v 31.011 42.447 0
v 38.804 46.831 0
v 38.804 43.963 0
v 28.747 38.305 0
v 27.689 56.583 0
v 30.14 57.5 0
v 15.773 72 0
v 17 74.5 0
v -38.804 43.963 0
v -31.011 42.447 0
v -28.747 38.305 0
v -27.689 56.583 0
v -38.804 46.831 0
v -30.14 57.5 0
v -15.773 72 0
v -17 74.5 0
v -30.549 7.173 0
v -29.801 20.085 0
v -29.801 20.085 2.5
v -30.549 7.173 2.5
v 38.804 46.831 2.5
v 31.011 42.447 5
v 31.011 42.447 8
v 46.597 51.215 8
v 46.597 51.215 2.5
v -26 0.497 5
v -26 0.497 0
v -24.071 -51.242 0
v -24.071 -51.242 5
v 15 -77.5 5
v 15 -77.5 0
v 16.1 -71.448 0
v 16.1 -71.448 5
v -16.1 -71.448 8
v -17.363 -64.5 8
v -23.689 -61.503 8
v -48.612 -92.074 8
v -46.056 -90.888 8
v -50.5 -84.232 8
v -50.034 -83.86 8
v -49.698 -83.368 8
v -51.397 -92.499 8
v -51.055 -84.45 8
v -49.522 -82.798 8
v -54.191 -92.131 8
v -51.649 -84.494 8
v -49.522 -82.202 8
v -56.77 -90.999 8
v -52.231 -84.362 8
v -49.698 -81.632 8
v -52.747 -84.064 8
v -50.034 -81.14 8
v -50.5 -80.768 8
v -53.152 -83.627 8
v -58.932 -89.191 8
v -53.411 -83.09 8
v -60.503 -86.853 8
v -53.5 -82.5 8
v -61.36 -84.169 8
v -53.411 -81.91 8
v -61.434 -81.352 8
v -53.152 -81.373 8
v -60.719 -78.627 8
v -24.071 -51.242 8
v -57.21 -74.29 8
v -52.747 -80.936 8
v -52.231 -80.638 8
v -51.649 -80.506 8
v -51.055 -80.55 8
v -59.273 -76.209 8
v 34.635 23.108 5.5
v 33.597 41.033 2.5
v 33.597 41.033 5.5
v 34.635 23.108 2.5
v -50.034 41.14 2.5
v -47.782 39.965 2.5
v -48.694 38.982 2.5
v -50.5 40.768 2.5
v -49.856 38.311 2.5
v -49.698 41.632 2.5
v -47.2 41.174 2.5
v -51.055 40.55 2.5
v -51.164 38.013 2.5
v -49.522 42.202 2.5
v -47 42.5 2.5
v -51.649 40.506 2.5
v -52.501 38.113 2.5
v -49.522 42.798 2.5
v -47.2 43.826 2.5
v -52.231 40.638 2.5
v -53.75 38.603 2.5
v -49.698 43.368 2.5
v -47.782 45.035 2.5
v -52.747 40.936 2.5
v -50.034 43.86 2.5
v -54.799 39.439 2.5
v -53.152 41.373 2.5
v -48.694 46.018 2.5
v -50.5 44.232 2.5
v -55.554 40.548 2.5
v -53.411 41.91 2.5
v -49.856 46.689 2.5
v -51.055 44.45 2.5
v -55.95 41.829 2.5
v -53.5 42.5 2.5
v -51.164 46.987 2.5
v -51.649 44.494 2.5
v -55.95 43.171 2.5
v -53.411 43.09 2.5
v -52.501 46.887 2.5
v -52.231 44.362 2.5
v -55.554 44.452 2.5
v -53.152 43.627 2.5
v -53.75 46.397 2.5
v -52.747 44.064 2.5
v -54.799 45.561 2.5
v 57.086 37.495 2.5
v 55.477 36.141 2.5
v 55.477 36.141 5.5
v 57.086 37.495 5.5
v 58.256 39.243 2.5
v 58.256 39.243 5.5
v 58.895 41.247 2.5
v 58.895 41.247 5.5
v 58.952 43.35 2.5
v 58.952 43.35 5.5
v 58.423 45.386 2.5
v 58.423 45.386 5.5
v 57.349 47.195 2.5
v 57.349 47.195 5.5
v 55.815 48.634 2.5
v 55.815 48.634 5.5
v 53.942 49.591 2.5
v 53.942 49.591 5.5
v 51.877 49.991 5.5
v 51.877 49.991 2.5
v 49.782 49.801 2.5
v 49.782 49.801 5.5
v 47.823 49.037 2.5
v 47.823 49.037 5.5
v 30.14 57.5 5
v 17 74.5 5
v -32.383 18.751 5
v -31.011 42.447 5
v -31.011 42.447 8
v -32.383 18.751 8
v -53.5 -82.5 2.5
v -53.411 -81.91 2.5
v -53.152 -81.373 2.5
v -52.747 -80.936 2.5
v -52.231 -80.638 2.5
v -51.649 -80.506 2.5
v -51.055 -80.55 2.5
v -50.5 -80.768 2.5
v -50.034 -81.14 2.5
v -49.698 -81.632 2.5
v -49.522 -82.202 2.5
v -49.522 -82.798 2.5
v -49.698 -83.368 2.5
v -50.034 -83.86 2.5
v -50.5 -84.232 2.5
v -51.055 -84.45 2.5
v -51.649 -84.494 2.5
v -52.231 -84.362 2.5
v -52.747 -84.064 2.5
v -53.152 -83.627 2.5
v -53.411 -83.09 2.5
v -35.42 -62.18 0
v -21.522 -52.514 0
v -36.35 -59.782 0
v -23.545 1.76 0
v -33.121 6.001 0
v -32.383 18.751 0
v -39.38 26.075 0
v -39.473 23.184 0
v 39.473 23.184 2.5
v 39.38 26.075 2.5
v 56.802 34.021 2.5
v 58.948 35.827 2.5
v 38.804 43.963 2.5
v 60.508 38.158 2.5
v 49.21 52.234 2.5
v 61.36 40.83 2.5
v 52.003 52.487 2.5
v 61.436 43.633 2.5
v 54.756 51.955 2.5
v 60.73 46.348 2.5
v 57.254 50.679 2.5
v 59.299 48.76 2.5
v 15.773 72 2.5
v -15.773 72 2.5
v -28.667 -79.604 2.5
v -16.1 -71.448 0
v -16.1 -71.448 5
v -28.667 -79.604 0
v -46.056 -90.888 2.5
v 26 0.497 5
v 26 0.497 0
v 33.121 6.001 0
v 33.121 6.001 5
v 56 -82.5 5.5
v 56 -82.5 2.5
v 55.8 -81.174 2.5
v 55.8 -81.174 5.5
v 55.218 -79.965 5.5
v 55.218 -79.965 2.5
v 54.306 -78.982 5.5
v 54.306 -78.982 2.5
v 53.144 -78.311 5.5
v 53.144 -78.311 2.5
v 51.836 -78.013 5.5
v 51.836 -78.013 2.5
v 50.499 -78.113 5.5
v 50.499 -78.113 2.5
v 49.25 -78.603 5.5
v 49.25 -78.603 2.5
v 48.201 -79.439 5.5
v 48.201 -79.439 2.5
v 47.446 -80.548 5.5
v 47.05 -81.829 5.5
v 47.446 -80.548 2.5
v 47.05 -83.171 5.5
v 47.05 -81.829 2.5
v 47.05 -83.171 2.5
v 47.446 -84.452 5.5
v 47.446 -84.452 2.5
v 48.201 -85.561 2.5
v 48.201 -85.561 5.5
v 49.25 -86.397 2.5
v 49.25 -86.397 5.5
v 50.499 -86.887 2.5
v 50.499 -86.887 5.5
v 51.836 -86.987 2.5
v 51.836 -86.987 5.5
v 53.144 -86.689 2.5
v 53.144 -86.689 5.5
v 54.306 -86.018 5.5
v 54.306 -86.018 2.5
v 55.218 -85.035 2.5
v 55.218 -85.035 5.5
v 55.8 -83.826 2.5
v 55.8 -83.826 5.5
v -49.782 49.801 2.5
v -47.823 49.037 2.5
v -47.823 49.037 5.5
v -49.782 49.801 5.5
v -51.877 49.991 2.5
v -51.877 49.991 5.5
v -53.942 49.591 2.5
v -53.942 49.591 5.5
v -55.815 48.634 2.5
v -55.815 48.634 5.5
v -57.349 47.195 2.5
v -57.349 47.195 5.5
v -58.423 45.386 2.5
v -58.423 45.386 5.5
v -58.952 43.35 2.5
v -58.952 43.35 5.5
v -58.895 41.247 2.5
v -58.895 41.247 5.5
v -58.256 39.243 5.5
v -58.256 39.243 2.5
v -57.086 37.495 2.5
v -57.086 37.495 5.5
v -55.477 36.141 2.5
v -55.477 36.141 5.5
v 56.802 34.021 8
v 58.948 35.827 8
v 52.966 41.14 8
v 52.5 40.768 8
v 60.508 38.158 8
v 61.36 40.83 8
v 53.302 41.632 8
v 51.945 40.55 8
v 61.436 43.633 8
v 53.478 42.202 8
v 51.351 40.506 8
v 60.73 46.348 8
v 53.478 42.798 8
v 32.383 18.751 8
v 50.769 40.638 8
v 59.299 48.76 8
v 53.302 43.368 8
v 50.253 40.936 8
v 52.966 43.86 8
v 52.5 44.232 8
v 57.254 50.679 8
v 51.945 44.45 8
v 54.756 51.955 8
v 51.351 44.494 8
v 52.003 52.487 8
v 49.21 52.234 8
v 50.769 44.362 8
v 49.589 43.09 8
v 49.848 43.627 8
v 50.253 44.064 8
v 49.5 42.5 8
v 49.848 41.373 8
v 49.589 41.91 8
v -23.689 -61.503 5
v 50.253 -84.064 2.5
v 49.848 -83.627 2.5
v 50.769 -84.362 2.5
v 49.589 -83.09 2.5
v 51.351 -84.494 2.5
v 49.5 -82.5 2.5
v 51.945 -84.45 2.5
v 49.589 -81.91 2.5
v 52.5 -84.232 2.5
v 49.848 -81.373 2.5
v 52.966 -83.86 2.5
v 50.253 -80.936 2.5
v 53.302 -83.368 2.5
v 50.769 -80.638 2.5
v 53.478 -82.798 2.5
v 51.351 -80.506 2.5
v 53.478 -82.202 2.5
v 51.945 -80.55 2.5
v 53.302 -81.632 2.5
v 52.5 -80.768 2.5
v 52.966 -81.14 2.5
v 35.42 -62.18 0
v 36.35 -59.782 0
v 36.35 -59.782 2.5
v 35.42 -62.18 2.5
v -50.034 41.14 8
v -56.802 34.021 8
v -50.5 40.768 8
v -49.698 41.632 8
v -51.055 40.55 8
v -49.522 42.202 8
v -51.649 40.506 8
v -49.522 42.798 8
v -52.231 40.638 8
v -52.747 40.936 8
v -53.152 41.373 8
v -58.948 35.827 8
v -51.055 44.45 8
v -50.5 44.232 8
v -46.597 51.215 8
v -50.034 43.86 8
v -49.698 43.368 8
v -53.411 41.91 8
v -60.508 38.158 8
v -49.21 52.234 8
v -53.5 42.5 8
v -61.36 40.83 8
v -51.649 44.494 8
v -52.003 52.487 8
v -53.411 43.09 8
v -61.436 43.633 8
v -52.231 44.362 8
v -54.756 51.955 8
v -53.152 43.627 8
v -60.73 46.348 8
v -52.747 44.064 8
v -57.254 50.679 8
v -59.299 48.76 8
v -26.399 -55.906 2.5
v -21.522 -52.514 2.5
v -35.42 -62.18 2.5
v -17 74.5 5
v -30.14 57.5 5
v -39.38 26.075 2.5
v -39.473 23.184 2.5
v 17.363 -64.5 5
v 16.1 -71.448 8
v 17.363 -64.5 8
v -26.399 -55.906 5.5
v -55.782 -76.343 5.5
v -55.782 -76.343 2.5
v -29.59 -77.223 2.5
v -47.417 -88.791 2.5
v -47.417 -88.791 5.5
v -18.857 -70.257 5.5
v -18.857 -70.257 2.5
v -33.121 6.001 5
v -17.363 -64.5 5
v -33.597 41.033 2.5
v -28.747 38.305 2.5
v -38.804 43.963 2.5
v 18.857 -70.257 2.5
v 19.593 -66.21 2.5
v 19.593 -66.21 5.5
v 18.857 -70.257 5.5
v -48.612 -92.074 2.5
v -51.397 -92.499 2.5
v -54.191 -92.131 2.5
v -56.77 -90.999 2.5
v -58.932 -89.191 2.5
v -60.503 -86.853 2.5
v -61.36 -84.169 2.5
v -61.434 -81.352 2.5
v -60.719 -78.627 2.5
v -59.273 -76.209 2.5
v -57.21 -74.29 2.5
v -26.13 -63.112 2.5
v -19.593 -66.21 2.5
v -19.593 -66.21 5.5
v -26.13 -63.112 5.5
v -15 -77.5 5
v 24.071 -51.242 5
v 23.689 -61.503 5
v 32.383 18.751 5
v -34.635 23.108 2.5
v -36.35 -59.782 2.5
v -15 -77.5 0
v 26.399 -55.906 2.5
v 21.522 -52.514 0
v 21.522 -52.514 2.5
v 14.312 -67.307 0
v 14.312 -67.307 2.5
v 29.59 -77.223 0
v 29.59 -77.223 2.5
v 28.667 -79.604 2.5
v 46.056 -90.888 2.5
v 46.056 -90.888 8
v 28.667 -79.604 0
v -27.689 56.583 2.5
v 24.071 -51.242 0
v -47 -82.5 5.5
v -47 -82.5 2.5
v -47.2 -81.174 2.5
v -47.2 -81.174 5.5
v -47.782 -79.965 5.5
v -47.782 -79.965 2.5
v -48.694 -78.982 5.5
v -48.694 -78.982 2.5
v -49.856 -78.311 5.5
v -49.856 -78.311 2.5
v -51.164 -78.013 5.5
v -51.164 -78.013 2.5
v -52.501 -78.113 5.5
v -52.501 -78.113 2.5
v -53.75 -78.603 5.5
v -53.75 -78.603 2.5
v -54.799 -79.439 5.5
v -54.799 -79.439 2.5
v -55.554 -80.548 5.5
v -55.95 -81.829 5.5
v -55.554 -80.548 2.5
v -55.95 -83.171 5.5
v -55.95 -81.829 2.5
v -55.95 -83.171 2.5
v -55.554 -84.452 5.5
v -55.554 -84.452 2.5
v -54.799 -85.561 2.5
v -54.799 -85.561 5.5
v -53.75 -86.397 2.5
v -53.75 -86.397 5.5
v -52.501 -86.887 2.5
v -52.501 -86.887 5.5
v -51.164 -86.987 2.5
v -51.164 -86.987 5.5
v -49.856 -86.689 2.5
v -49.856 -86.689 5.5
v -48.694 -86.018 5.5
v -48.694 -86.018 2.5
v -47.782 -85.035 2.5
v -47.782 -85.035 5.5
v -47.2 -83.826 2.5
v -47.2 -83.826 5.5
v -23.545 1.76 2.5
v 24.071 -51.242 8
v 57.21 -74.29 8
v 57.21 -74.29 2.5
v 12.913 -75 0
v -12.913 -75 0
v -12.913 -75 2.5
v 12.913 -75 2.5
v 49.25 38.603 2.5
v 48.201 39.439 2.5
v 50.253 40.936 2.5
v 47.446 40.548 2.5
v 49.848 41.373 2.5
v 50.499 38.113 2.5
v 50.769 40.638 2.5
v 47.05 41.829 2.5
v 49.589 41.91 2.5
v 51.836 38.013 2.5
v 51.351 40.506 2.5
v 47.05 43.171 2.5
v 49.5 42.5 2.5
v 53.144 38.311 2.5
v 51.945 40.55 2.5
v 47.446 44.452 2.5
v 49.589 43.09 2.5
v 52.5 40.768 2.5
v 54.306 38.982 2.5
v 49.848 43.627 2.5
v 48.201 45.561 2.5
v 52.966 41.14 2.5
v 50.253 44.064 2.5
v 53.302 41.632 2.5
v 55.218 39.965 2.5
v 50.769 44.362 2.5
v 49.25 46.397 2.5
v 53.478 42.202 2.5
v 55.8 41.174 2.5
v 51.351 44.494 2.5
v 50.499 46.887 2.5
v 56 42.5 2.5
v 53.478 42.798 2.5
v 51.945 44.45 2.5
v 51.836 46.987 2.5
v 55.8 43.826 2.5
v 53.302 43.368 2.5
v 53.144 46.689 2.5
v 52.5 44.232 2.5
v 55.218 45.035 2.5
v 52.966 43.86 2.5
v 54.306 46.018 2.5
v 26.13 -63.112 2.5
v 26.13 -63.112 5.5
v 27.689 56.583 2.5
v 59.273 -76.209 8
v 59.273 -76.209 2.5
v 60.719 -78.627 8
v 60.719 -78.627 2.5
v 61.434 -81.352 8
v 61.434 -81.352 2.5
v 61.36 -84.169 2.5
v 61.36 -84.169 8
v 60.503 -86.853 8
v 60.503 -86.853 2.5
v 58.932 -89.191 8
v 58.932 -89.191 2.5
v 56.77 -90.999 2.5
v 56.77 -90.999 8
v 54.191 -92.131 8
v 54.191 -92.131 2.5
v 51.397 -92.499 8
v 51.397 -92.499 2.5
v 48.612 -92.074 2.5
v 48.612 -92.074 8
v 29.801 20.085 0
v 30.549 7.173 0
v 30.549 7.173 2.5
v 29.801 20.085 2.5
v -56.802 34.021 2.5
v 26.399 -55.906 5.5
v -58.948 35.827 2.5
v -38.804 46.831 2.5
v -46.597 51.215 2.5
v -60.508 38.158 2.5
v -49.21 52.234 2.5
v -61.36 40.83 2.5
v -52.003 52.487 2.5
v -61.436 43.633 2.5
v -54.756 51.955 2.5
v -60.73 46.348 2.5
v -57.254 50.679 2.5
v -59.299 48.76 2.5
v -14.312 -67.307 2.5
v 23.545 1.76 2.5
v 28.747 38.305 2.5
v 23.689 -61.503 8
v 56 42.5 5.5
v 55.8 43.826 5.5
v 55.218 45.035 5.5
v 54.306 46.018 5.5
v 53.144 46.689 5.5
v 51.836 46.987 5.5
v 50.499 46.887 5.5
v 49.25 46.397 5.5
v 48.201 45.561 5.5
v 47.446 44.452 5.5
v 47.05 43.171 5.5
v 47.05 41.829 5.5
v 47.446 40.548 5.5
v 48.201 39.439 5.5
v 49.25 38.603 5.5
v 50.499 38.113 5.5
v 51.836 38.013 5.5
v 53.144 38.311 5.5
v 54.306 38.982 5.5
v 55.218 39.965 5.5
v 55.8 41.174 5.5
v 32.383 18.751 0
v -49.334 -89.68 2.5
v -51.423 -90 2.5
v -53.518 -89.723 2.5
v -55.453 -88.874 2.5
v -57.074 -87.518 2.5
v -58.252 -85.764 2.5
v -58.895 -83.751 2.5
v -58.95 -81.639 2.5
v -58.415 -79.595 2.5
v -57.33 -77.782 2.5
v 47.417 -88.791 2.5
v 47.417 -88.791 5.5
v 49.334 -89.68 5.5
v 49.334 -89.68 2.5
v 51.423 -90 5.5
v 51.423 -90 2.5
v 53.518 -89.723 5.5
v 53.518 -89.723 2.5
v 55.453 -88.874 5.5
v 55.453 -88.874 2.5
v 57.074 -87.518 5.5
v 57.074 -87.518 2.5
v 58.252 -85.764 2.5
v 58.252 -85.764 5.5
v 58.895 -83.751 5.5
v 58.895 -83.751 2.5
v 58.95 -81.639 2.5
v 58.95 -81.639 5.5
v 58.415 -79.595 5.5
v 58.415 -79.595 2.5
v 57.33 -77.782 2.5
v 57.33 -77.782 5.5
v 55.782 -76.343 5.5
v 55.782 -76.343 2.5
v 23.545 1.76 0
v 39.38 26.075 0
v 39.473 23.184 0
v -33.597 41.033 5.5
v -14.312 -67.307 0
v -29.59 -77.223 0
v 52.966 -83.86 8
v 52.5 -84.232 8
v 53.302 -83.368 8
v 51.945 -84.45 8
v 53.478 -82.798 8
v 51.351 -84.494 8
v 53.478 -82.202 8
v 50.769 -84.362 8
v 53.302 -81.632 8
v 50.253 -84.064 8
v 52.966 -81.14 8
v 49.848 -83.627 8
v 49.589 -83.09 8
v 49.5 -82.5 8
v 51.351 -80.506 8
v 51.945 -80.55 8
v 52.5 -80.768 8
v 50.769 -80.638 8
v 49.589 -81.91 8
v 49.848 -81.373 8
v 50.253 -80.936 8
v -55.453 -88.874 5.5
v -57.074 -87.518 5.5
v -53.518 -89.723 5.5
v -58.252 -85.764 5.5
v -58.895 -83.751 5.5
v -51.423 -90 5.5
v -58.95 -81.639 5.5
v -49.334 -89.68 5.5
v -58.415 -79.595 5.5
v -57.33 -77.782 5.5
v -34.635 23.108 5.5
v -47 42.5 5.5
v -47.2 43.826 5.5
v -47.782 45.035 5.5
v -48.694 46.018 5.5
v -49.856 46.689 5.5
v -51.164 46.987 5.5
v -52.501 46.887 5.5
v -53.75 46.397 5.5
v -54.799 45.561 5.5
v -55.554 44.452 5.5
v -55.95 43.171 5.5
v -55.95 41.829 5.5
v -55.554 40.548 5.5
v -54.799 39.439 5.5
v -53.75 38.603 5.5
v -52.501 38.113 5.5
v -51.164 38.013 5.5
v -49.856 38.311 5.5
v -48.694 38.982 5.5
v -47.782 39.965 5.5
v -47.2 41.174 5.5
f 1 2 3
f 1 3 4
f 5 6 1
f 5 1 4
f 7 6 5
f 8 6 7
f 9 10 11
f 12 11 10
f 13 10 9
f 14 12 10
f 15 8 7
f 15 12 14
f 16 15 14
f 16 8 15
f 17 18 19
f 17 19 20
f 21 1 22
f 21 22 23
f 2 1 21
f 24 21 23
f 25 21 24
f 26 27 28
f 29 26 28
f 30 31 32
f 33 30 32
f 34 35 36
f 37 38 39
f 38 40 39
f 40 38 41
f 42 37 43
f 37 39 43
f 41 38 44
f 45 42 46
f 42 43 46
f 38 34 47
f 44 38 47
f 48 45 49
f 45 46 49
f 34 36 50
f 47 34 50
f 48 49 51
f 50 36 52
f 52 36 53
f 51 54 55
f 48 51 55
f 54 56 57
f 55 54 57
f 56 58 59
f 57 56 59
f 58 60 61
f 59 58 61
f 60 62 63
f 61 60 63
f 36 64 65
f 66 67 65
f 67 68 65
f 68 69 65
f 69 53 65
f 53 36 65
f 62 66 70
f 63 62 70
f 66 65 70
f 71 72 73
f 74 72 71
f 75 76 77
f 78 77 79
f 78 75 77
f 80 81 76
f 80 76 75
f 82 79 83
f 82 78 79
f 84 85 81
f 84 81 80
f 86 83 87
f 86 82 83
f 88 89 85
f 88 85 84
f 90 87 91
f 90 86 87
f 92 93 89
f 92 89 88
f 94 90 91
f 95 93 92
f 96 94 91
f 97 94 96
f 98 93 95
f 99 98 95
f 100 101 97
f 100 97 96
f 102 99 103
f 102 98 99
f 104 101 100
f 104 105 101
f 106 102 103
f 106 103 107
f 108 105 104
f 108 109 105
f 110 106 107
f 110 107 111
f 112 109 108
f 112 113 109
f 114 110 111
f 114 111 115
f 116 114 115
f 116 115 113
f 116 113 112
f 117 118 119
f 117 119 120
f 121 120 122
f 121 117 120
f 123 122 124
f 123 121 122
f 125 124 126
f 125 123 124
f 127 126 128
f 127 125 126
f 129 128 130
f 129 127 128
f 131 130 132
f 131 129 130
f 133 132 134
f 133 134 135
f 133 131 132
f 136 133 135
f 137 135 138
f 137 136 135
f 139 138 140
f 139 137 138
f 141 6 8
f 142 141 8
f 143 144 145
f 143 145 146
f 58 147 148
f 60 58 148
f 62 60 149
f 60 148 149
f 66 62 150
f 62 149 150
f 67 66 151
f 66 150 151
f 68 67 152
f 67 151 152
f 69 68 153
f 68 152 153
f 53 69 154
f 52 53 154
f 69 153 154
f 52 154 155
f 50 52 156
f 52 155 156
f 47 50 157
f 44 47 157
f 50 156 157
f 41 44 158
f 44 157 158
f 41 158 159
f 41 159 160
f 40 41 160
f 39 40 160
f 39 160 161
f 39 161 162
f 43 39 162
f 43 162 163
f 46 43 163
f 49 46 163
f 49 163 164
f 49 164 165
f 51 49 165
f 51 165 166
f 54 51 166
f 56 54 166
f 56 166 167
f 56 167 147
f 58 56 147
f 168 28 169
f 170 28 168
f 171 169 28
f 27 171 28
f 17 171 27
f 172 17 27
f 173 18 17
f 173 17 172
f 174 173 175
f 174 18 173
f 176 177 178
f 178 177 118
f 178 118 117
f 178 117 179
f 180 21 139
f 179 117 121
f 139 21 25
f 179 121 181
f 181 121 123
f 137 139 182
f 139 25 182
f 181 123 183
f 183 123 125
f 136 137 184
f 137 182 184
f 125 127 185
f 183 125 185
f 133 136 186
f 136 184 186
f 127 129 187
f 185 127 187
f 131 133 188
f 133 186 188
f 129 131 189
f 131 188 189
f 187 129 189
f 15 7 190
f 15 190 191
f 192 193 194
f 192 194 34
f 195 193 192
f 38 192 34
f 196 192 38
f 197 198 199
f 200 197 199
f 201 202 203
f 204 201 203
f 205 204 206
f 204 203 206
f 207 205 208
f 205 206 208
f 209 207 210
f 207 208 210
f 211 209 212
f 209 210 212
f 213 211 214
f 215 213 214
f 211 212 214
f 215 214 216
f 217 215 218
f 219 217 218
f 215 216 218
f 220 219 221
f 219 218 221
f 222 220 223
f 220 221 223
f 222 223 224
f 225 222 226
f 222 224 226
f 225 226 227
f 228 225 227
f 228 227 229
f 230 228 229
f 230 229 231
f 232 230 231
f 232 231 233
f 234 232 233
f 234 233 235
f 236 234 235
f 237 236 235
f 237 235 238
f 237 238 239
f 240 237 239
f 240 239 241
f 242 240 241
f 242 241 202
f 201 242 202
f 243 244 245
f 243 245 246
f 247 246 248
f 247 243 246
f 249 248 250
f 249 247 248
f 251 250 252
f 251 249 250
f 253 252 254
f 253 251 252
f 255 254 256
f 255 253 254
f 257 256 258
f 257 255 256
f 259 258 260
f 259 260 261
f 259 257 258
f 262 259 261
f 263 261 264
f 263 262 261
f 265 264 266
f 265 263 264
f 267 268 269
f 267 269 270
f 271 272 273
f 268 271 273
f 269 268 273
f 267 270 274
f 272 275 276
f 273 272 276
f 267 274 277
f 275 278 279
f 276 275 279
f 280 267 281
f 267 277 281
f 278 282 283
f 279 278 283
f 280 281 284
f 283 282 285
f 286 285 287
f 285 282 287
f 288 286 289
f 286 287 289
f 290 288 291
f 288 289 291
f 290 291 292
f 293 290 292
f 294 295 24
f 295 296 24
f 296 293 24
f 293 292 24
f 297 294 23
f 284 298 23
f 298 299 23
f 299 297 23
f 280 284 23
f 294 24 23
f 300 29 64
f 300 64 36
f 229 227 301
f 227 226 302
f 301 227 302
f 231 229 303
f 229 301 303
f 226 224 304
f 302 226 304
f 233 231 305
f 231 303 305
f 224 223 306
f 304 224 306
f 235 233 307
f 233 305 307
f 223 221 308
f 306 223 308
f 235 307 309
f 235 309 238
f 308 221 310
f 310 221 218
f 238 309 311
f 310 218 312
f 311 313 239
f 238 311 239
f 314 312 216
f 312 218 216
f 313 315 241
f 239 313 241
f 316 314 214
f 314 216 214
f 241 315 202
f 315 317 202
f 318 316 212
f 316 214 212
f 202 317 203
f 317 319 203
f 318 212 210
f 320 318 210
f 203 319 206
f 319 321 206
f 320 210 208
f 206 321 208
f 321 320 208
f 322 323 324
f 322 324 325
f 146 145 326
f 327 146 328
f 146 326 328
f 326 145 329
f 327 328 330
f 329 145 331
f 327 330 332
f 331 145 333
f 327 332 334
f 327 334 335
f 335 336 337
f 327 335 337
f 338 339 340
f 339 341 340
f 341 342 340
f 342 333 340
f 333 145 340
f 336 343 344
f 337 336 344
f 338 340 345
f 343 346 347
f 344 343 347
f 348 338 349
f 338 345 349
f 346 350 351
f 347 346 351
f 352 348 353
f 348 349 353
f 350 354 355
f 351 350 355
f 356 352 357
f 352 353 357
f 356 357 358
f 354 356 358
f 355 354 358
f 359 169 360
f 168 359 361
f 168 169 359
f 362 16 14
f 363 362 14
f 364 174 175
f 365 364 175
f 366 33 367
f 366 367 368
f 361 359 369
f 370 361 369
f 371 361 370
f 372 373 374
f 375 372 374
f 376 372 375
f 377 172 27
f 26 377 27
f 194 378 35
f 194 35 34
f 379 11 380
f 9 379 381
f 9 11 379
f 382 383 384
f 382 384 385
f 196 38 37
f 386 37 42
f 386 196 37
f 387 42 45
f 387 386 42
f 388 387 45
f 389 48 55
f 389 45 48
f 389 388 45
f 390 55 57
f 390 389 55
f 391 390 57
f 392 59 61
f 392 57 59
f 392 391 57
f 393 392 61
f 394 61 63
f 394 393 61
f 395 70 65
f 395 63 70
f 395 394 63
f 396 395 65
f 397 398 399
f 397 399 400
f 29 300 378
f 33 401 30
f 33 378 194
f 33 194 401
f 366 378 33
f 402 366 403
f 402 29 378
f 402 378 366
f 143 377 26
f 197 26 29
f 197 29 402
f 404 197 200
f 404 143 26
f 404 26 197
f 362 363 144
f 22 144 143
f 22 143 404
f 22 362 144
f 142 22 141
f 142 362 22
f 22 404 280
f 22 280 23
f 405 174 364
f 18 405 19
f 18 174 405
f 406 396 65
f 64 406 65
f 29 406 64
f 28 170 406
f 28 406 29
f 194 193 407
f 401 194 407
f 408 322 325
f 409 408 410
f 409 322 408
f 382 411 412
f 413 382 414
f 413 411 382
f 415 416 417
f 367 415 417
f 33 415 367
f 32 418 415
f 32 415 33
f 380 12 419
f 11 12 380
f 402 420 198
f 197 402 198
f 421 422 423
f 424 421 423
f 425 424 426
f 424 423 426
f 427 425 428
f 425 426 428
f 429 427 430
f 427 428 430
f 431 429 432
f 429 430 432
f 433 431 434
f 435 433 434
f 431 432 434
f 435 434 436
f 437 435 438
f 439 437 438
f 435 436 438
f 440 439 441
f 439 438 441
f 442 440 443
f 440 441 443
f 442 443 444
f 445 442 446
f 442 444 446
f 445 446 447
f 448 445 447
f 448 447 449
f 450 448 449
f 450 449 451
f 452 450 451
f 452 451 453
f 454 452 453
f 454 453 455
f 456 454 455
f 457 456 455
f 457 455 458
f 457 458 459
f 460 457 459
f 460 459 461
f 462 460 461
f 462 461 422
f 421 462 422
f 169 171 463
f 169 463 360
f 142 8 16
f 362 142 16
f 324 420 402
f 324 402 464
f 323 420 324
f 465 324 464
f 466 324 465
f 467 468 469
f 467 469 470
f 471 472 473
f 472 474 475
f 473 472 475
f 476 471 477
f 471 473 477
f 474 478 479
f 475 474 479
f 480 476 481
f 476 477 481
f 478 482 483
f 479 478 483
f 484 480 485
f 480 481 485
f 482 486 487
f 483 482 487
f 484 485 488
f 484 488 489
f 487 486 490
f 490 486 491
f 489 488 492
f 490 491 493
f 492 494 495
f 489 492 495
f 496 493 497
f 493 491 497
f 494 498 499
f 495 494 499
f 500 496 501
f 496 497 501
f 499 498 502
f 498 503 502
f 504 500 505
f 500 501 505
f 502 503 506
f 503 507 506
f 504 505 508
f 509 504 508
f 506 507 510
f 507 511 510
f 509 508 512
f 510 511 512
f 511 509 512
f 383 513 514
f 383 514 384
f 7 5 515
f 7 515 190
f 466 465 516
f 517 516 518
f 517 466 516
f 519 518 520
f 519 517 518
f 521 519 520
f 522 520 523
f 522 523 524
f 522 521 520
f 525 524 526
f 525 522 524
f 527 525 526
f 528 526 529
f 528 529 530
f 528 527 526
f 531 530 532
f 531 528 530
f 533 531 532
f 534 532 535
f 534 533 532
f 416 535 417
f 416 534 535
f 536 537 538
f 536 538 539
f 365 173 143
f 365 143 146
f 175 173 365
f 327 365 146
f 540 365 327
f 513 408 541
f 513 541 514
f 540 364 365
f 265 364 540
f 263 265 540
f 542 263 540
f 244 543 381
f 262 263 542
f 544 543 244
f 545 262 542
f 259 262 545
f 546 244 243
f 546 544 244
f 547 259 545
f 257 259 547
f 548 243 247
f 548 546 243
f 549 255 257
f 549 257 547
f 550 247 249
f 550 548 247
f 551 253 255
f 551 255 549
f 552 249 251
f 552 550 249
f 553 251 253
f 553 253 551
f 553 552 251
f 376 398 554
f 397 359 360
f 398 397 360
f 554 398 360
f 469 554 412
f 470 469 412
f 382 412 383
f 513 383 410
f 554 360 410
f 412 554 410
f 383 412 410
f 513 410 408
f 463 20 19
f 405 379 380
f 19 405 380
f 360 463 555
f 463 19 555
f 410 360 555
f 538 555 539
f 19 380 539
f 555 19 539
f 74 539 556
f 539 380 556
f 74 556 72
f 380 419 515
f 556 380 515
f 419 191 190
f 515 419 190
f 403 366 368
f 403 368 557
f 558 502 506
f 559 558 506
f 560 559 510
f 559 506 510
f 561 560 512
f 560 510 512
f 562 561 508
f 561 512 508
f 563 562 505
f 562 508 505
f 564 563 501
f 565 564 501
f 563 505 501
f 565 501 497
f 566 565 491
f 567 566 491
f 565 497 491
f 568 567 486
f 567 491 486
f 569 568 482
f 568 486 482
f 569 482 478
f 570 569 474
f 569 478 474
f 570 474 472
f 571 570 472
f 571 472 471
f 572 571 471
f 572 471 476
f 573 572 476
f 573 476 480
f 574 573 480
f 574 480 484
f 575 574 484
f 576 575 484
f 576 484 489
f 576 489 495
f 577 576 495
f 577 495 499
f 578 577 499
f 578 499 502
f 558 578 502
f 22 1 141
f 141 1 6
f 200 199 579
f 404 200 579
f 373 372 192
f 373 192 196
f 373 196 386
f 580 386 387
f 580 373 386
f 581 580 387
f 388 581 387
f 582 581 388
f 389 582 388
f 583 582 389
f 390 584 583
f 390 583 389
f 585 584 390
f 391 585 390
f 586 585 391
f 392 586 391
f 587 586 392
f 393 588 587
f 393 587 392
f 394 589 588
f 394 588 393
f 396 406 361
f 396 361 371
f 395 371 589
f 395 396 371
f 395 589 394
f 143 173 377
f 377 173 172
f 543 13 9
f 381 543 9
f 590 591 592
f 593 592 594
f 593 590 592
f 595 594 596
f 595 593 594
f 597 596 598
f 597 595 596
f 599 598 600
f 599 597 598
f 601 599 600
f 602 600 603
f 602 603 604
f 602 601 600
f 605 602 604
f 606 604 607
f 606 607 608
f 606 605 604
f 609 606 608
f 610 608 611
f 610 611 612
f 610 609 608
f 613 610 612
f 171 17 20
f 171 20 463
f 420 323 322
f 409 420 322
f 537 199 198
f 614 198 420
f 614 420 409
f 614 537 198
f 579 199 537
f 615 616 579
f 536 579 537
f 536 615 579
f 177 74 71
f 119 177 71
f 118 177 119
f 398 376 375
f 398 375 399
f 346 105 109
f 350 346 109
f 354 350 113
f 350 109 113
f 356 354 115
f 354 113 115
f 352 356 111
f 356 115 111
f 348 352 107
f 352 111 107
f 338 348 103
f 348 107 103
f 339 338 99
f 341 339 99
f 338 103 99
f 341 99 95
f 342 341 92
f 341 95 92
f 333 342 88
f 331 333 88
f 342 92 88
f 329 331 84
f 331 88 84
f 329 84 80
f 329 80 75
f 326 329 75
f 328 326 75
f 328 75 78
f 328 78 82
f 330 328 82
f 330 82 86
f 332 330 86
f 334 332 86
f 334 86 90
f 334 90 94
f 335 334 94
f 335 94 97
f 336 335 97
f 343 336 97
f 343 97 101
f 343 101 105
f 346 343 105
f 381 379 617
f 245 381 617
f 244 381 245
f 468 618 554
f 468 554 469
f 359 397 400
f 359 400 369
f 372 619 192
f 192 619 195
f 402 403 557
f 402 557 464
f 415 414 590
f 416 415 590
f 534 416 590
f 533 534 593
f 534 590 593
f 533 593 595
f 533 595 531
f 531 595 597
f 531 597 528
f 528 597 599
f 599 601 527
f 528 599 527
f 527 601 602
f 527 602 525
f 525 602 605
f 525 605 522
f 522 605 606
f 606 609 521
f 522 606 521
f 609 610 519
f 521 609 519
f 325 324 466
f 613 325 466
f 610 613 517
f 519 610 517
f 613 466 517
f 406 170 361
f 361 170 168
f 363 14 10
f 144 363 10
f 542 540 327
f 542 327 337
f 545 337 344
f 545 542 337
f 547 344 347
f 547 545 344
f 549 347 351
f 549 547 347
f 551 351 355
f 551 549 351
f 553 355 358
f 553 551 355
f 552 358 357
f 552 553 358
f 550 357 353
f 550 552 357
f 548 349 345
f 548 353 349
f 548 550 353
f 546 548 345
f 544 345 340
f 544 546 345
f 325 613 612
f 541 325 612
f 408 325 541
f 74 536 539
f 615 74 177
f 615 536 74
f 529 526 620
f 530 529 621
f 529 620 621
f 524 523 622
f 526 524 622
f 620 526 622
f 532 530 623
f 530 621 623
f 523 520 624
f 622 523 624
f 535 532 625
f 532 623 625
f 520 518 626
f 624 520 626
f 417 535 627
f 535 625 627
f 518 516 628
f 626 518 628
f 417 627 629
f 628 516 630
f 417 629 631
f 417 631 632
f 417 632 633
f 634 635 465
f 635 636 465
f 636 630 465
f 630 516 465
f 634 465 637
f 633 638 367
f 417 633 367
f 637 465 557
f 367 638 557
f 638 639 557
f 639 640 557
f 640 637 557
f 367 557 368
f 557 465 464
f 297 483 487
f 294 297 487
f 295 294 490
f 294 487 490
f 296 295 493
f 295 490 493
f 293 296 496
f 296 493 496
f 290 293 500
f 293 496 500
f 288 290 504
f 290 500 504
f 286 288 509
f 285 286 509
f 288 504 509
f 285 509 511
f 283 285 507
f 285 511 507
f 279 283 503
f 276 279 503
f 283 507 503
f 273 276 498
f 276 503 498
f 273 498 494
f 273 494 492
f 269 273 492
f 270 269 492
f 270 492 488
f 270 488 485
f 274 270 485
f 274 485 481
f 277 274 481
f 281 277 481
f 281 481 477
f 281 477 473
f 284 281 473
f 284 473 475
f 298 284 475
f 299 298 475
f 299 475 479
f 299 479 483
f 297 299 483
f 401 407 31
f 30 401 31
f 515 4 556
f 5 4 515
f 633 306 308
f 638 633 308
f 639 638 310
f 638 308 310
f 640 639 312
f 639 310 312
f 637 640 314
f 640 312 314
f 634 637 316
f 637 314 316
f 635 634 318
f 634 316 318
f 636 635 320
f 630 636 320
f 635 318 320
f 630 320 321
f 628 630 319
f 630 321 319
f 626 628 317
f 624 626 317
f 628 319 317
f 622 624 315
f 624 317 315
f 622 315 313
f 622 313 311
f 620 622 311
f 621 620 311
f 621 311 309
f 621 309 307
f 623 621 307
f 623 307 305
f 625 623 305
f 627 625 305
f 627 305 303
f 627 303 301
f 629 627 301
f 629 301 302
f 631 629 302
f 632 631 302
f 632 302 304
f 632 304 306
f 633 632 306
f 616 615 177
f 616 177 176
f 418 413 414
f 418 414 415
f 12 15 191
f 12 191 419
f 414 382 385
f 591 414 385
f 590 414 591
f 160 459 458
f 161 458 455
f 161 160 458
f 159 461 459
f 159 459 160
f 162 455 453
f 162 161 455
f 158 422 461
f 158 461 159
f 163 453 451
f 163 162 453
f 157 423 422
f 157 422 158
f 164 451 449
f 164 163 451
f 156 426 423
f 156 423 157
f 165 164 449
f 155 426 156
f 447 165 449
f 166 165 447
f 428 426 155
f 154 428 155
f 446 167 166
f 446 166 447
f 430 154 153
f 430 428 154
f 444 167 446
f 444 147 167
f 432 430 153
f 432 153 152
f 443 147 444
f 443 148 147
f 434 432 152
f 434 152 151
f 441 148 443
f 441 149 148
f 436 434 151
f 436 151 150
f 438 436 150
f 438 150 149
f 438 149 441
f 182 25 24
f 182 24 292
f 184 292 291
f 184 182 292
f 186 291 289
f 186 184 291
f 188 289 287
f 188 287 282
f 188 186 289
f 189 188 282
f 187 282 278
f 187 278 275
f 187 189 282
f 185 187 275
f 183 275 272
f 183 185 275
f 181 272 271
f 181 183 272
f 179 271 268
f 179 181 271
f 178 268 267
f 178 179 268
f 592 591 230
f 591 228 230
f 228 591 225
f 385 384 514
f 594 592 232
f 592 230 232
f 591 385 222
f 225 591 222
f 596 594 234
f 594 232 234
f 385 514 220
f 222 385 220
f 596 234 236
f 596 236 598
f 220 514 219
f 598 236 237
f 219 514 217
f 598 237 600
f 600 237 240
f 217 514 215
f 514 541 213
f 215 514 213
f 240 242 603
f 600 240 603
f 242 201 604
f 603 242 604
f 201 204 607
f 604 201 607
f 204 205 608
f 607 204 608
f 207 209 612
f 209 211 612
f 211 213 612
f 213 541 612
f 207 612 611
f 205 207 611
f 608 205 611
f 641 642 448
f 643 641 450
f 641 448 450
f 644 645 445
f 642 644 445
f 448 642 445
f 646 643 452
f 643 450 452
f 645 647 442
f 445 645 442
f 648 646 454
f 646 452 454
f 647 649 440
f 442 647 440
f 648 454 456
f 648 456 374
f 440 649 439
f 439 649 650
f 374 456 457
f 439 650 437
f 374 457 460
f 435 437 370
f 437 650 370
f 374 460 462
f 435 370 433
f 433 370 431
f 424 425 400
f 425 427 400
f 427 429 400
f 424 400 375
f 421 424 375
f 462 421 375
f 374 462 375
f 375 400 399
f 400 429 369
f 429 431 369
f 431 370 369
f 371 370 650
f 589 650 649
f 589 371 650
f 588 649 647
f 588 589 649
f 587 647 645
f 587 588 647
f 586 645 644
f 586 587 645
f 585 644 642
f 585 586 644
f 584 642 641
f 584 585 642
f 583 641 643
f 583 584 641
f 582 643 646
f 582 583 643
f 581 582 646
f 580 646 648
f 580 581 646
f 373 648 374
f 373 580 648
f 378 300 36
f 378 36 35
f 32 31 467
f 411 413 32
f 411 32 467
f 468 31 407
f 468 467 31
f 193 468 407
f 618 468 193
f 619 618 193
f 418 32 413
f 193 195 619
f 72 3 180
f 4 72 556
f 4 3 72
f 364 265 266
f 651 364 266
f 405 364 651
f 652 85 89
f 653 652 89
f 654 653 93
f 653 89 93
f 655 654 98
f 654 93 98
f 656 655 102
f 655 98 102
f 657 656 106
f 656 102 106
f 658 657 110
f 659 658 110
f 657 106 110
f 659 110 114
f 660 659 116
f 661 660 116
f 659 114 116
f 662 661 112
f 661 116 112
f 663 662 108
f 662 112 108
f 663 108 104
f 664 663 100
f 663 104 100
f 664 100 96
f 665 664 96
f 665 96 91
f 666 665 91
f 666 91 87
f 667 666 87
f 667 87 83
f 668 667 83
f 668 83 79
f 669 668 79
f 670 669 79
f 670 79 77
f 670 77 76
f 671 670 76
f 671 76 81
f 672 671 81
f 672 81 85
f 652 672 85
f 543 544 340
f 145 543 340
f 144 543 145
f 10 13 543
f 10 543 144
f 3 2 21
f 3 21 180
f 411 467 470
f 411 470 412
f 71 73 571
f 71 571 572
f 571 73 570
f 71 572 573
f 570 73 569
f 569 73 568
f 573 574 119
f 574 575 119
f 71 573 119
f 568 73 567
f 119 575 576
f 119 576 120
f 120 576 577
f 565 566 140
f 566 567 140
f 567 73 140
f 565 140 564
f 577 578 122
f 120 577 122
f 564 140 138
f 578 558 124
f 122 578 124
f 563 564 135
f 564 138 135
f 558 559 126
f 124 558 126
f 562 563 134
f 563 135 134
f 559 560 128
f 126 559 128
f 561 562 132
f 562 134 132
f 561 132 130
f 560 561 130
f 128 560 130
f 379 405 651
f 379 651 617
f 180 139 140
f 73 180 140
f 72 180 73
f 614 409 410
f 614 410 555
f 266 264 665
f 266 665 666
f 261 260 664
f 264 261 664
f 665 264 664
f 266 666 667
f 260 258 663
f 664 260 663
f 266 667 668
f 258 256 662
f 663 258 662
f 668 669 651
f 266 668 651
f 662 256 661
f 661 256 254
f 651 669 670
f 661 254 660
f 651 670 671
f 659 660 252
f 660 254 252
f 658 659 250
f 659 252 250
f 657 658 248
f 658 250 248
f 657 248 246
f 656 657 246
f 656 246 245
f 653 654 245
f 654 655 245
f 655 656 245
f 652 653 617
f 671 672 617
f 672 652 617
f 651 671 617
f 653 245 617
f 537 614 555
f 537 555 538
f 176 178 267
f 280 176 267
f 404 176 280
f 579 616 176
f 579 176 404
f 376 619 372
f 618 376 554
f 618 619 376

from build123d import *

# Parameters (mm, degrees)
EXTRUDE_1_DEPTH     = 5
SKETCH_2_R          = 10
SKETCH_2_R_2        = 2
EXTRUDE_2_DEPTH     = 8
SHELL_1_OUTLINE_R   = 4.5
SHELL_1_DEPTH       = 2.5
SHELL_START         = 2.5
SHELL_1_2_OUTLINE_R = 4.5
SHELL_1_2_DEPTH     = 3
CUT_EXTRUDE_6_DEPTH = 2.5


with BuildPart() as part:
    # ｽｹｯﾁ1 → ﾎﾞｽ - 押し出し1 (new body)
    with BuildSketch(Plane.XY):
        Polygon((-15, -77.5), (15, -77.5), (17.362836016, -64.5), (23.688654544, -61.502664525), (26, 0.497335475), (33.120827994, 6.001316642), (30.14, 57.5), (17, 74.5), (-17, 74.5), (-30.14, 57.5), (-33.120827994, 6.001316642), (-26, 0.497335475), (-23.688654544, -61.502664525), (-17.362836016, -64.5), align=None)
    extrude(amount=EXTRUDE_1_DEPTH)

    # ｽｹｯﾁ2 → ﾎﾞｽ - 押し出し2 (add)
    # profile 1 of 8: a face of its own
    with BuildSketch(Plane(origin=(0, 0, 0), x_dir=(-1, 0, 0), z_dir=(0, 0, -1))):
        with BuildLine():
            Line((-32.382872215, 18.750710787), (-31.011292455, 42.446996487))
            Line((-31.011292455, 42.446996487), (-46.596716305, 51.215377732))
            ThreePointArc((-46.596716305, 51.215377732), (-42.867710705, 47.548126536), (-41.5, 42.5))
            ThreePointArc((-41.5, 42.5), (-46.653423142, 33.752960915), (-56.802138552, 34.021360559))
            Line((-56.802138552, 34.021360559), (-32.382872215, 18.750710787))
        make_face()
    # profile 2 of 8: a face of its own
    with BuildSketch(Plane(origin=(0, 0, 0), x_dir=(-1, 0, 0), z_dir=(0, 0, -1))):
        with Locations((-51.5, 42.5)):
            Circle(SKETCH_2_R)
        with Locations((-51.5, 42.5)):
            Circle(SKETCH_2_R_2, mode=Mode.SUBTRACT)
    # profile 3 of 8: a face of its own
    with BuildSketch(Plane(origin=(0, 0, 0), x_dir=(-1, 0, 0), z_dir=(0, 0, -1))):
        with Locations((51.5, 42.5)):
            Circle(SKETCH_2_R)
        with Locations((51.5, 42.5)):
            Circle(SKETCH_2_R_2, mode=Mode.SUBTRACT)
    # profile 4 of 8: a face of its own
    with BuildSketch(Plane(origin=(0, 0, 0), x_dir=(-1, 0, 0), z_dir=(0, 0, -1))):
        with Locations((51.5, -82.5)):
            Circle(SKETCH_2_R)
        with Locations((51.5, -82.5)):
            Circle(SKETCH_2_R_2, mode=Mode.SUBTRACT)
    # profile 5 of 8: a face of its own
    with BuildSketch(Plane(origin=(0, 0, 0), x_dir=(-1, 0, 0), z_dir=(0, 0, -1))):
        with BuildLine():
            Line((16.09996425, -71.448147417), (46.056282089, -90.888440577))
            ThreePointArc((46.056282089, -90.888440577), (43.199925585, -76.922476831), (57.20989431, -74.290425896))
            Line((57.20989431, -74.290425896), (24.071173493, -51.241898524))
            Line((24.071173493, -51.241898524), (23.688654544, -61.502664525))
            Line((23.688654544, -61.502664525), (17.362836016, -64.5))
            Line((17.362836016, -64.5), (16.09996425, -71.448147417))
        make_face()
    # profile 6 of 8: a face of its own
    with BuildSketch(Plane(origin=(0, 0, 0), x_dir=(-1, 0, 0), z_dir=(0, 0, -1))):
        with BuildLine():
            ThreePointArc((56.802138552, 34.021360559), (42.900678635, 37.395916139), (46.596716305, 51.215377732))
            Line((46.596716305, 51.215377732), (31.011292455, 42.446996487))
            Line((31.011292455, 42.446996487), (32.382872215, 18.750710787))
            Line((32.382872215, 18.750710787), (56.802138552, 34.021360559))
        make_face()
    # profile 7 of 8: a face of its own
    with BuildSketch(Plane(origin=(0, 0, 0), x_dir=(-1, 0, 0), z_dir=(0, 0, -1))):
        with BuildLine():
            Line((-46.056282089, -90.888440577), (-16.09996425, -71.448147417))
            Line((-16.09996425, -71.448147417), (-17.362836016, -64.5))
            Line((-17.362836016, -64.5), (-23.688654544, -61.502664525))
            Line((-23.688654544, -61.502664525), (-24.071173493, -51.241898524))
            Line((-24.071173493, -51.241898524), (-57.20989431, -74.290425896))
            ThreePointArc((-57.20989431, -74.290425896), (-46.868528479, -73.637186025), (-41.5, -82.5))
            ThreePointArc((-41.5, -82.5), (-42.712589144, -87.272987581), (-46.056282089, -90.888440577))
        make_face()
    # profile 8 of 8: a face of its own
    with BuildSketch(Plane(origin=(0, 0, 0), x_dir=(-1, 0, 0), z_dir=(0, 0, -1))):
        with Locations((-51.5, -82.5)):
            Circle(SKETCH_2_R)
        with Locations((-51.5, -82.5)):
            Circle(SKETCH_2_R_2, mode=Mode.SUBTRACT)
    extrude(amount=-EXTRUDE_2_DEPTH)

    # ｼｪﾙ1: read off the stored shape, not the designer's step
    # ｼｪﾙ1 outline → ｼｪﾙ1 (cut)
    with BuildSketch(Plane.XY):
        with BuildLine():
            Line((21.522008123, -52.514136891), (23.545326343, 1.75976204))
            Line((23.545326343, 1.75976204), (30.548821684, 7.173051968))
            Line((30.548821684, 7.173051968), (29.801456877, 20.085002485))
            Line((29.801456877, 20.085002485), (55.476603914, 36.141020419))
            ThreePointArc((55.476603914, 36.141020419), (57.949491024, 46.328062896), (47.822537229, 49.036533299))
            Line((47.822537229, 49.036533299), (28.746880144, 38.304541956))
            Line((28.746880144, 38.304541956), (27.688881042, 56.583208435))
            Line((27.688881042, 56.583208435), (15.772608032, 72))
            Line((15.772608032, 72), (-15.772608032, 72))
            Line((-15.772608032, 72), (-27.688881042, 56.583208435))
            Line((-27.688881042, 56.583208435), (-28.746880144, 38.304541956))
            Line((-28.746880144, 38.304541956), (-47.822537229, 49.036533299))
            ThreePointArc((-47.822537229, 49.036533299), (-57.949491024, 46.328062896), (-55.476603914, 36.141020419))
            Line((-55.476603914, 36.141020419), (-29.801456877, 20.085002485))
            Line((-29.801456877, 20.085002485), (-30.548821684, 7.173051968))
            Line((-30.548821684, 7.173051968), (-23.545326343, 1.75976204))
            Line((-23.545326343, 1.75976204), (-21.522008123, -52.514136891))
            Line((-21.522008123, -52.514136891), (-55.782420733, -76.342819422))
            ThreePointArc((-55.782420733, -76.342819422), (-57.725055812, -86.683142377), (-47.417211567, -88.791330433))
            Line((-47.417211567, -88.791330433), (-14.311630395, -67.307308042))
            Line((-14.311630395, -67.307308042), (-12.913432732, -75))
            Line((-12.913432732, -75), (12.913432732, -75))
            Line((12.913432732, -75), (14.311630395, -67.307308042))
            Line((14.311630395, -67.307308042), (47.417211567, -88.791330433))
            ThreePointArc((47.417211567, -88.791330433), (57.725055812, -86.683142377), (55.782420733, -76.342819422))
            Line((55.782420733, -76.342819422), (21.522008123, -52.514136891))
        make_face()
        with Locations((51.5, -82.5)):
            Circle(SHELL_1_OUTLINE_R, mode=Mode.SUBTRACT)
        with Locations((-51.5, -82.5)):
            Circle(SHELL_1_OUTLINE_R, mode=Mode.SUBTRACT)
        with Locations((-51.5, 42.5)):
            Circle(SHELL_1_OUTLINE_R, mode=Mode.SUBTRACT)
        with Locations((51.5, 42.5)):
            Circle(SHELL_1_OUTLINE_R, mode=Mode.SUBTRACT)
    extrude(amount=SHELL_1_DEPTH, mode=Mode.SUBTRACT)

    # Shell 1 2 outline → Shell 1 2 (cut)
    # profile 1 of 4: a face of its own
    with BuildSketch(Plane.XY.offset(SHELL_START)):
        with BuildLine():
            Line((55.782420733, -76.342819422), (26.399026656, -55.906183789))
            Line((26.399026656, -55.906183789), (26.130390005, -63.112147889))
            Line((26.130390005, -63.112147889), (19.593043591, -66.209710715))
            Line((19.593043591, -66.209710715), (18.857369821, -70.257286993))
            Line((18.857369821, -70.257286993), (47.417211567, -88.791330433))
            ThreePointArc((47.417211567, -88.791330433), (57.725055812, -86.683142377), (55.782420733, -76.342819422))
        make_face()
        with Locations((51.5, -82.5)):
            Circle(SHELL_1_2_OUTLINE_R, mode=Mode.SUBTRACT)
    # profile 2 of 4: a face of its own
    with BuildSketch(Plane.XY.offset(SHELL_START)):
        with BuildLine():
            Line((33.597298428, 41.033394063), (34.634873185, 23.10759156))
            Line((34.634873185, 23.10759156), (55.476603914, 36.141020419))
            ThreePointArc((55.476603914, 36.141020419), (57.949491024, 46.328062896), (47.822537229, 49.036533299))
            Line((47.822537229, 49.036533299), (33.597298428, 41.033394063))
        make_face()
        with Locations((51.5, 42.5)):
            Circle(SHELL_1_2_OUTLINE_R, mode=Mode.SUBTRACT)
    # profile 3 of 4: a face of its own
    with BuildSketch(Plane.XY.offset(SHELL_START)):
        with BuildLine():
            Line((-47.417211567, -88.791330433), (-18.857369821, -70.257286993))
            Line((-18.857369821, -70.257286993), (-19.593043591, -66.209710715))
            Line((-19.593043591, -66.209710715), (-26.130390005, -63.112147889))
            Line((-26.130390005, -63.112147889), (-26.399026656, -55.90618379))
            Line((-26.399026656, -55.90618379), (-55.782420733, -76.342819422))
            ThreePointArc((-55.782420733, -76.342819422), (-57.725055812, -86.683142377), (-47.417211567, -88.791330433))
        make_face()
        with Locations((-51.5, -82.5)):
            Circle(SHELL_1_2_OUTLINE_R, mode=Mode.SUBTRACT)
    # profile 4 of 4: a face of its own
    with BuildSketch(Plane.XY.offset(SHELL_START)):
        with BuildLine():
            Line((-34.634873185, 23.10759156), (-33.597298428, 41.033394063))
            Line((-33.597298428, 41.033394063), (-47.822537229, 49.036533299))
            ThreePointArc((-47.822537229, 49.036533299), (-57.949491024, 46.328062896), (-55.476603914, 36.141020419))
            Line((-55.476603914, 36.141020419), (-34.634873185, 23.10759156))
        make_face()
        with Locations((-51.5, 42.5)):
            Circle(SHELL_1_2_OUTLINE_R, mode=Mode.SUBTRACT)
    extrude(amount=SHELL_1_2_DEPTH, mode=Mode.SUBTRACT)

    # ｽｹｯﾁ5 → ｶｯﾄ - 押し出し6 (cut)
    with BuildSketch(Plane(origin=(0, 0, 0), x_dir=(-1, 0, 0), z_dir=(0, 0, -1))):
        Polygon((-38.80400438, 46.831187109), (-38.80400438, 43.962694111), (-39.472839378, 23.184439628), (-51.319731768, 2.127093459), (-84.265468017, 28.099065241), (-81.185505749, 33.573566869), (-64.091586556, 65.569805047), (-41.966326194, 51.733717696), align=None)
        Polygon((-39.472839378, -51.723167443), (-24.731165472, -89.760648138), (-36.427967097, -116.261009638), (-70.745334213, -107.593739558), (-74.01113331, -73.736521524), align=None)
        Polygon((70.745334213, -107.593739558), (74.01113331, -73.736521524), (39.472839378, -51.723167443), (24.731165472, -89.760648138), (36.427967097, -116.261009638), align=None)
        Polygon((64.091586556, 65.569805047), (41.966326194, 51.733717696), (38.80400438, 46.831187109), (38.80400438, 43.962694111), (39.472839378, 23.184439628), (51.319731768, 2.127093459), (84.265468017, 28.099065241), (81.185505749, 33.573566869), align=None)
    extrude(amount=-CUT_EXTRUDE_6_DEPTH, mode=Mode.SUBTRACT)


solid = part.part
